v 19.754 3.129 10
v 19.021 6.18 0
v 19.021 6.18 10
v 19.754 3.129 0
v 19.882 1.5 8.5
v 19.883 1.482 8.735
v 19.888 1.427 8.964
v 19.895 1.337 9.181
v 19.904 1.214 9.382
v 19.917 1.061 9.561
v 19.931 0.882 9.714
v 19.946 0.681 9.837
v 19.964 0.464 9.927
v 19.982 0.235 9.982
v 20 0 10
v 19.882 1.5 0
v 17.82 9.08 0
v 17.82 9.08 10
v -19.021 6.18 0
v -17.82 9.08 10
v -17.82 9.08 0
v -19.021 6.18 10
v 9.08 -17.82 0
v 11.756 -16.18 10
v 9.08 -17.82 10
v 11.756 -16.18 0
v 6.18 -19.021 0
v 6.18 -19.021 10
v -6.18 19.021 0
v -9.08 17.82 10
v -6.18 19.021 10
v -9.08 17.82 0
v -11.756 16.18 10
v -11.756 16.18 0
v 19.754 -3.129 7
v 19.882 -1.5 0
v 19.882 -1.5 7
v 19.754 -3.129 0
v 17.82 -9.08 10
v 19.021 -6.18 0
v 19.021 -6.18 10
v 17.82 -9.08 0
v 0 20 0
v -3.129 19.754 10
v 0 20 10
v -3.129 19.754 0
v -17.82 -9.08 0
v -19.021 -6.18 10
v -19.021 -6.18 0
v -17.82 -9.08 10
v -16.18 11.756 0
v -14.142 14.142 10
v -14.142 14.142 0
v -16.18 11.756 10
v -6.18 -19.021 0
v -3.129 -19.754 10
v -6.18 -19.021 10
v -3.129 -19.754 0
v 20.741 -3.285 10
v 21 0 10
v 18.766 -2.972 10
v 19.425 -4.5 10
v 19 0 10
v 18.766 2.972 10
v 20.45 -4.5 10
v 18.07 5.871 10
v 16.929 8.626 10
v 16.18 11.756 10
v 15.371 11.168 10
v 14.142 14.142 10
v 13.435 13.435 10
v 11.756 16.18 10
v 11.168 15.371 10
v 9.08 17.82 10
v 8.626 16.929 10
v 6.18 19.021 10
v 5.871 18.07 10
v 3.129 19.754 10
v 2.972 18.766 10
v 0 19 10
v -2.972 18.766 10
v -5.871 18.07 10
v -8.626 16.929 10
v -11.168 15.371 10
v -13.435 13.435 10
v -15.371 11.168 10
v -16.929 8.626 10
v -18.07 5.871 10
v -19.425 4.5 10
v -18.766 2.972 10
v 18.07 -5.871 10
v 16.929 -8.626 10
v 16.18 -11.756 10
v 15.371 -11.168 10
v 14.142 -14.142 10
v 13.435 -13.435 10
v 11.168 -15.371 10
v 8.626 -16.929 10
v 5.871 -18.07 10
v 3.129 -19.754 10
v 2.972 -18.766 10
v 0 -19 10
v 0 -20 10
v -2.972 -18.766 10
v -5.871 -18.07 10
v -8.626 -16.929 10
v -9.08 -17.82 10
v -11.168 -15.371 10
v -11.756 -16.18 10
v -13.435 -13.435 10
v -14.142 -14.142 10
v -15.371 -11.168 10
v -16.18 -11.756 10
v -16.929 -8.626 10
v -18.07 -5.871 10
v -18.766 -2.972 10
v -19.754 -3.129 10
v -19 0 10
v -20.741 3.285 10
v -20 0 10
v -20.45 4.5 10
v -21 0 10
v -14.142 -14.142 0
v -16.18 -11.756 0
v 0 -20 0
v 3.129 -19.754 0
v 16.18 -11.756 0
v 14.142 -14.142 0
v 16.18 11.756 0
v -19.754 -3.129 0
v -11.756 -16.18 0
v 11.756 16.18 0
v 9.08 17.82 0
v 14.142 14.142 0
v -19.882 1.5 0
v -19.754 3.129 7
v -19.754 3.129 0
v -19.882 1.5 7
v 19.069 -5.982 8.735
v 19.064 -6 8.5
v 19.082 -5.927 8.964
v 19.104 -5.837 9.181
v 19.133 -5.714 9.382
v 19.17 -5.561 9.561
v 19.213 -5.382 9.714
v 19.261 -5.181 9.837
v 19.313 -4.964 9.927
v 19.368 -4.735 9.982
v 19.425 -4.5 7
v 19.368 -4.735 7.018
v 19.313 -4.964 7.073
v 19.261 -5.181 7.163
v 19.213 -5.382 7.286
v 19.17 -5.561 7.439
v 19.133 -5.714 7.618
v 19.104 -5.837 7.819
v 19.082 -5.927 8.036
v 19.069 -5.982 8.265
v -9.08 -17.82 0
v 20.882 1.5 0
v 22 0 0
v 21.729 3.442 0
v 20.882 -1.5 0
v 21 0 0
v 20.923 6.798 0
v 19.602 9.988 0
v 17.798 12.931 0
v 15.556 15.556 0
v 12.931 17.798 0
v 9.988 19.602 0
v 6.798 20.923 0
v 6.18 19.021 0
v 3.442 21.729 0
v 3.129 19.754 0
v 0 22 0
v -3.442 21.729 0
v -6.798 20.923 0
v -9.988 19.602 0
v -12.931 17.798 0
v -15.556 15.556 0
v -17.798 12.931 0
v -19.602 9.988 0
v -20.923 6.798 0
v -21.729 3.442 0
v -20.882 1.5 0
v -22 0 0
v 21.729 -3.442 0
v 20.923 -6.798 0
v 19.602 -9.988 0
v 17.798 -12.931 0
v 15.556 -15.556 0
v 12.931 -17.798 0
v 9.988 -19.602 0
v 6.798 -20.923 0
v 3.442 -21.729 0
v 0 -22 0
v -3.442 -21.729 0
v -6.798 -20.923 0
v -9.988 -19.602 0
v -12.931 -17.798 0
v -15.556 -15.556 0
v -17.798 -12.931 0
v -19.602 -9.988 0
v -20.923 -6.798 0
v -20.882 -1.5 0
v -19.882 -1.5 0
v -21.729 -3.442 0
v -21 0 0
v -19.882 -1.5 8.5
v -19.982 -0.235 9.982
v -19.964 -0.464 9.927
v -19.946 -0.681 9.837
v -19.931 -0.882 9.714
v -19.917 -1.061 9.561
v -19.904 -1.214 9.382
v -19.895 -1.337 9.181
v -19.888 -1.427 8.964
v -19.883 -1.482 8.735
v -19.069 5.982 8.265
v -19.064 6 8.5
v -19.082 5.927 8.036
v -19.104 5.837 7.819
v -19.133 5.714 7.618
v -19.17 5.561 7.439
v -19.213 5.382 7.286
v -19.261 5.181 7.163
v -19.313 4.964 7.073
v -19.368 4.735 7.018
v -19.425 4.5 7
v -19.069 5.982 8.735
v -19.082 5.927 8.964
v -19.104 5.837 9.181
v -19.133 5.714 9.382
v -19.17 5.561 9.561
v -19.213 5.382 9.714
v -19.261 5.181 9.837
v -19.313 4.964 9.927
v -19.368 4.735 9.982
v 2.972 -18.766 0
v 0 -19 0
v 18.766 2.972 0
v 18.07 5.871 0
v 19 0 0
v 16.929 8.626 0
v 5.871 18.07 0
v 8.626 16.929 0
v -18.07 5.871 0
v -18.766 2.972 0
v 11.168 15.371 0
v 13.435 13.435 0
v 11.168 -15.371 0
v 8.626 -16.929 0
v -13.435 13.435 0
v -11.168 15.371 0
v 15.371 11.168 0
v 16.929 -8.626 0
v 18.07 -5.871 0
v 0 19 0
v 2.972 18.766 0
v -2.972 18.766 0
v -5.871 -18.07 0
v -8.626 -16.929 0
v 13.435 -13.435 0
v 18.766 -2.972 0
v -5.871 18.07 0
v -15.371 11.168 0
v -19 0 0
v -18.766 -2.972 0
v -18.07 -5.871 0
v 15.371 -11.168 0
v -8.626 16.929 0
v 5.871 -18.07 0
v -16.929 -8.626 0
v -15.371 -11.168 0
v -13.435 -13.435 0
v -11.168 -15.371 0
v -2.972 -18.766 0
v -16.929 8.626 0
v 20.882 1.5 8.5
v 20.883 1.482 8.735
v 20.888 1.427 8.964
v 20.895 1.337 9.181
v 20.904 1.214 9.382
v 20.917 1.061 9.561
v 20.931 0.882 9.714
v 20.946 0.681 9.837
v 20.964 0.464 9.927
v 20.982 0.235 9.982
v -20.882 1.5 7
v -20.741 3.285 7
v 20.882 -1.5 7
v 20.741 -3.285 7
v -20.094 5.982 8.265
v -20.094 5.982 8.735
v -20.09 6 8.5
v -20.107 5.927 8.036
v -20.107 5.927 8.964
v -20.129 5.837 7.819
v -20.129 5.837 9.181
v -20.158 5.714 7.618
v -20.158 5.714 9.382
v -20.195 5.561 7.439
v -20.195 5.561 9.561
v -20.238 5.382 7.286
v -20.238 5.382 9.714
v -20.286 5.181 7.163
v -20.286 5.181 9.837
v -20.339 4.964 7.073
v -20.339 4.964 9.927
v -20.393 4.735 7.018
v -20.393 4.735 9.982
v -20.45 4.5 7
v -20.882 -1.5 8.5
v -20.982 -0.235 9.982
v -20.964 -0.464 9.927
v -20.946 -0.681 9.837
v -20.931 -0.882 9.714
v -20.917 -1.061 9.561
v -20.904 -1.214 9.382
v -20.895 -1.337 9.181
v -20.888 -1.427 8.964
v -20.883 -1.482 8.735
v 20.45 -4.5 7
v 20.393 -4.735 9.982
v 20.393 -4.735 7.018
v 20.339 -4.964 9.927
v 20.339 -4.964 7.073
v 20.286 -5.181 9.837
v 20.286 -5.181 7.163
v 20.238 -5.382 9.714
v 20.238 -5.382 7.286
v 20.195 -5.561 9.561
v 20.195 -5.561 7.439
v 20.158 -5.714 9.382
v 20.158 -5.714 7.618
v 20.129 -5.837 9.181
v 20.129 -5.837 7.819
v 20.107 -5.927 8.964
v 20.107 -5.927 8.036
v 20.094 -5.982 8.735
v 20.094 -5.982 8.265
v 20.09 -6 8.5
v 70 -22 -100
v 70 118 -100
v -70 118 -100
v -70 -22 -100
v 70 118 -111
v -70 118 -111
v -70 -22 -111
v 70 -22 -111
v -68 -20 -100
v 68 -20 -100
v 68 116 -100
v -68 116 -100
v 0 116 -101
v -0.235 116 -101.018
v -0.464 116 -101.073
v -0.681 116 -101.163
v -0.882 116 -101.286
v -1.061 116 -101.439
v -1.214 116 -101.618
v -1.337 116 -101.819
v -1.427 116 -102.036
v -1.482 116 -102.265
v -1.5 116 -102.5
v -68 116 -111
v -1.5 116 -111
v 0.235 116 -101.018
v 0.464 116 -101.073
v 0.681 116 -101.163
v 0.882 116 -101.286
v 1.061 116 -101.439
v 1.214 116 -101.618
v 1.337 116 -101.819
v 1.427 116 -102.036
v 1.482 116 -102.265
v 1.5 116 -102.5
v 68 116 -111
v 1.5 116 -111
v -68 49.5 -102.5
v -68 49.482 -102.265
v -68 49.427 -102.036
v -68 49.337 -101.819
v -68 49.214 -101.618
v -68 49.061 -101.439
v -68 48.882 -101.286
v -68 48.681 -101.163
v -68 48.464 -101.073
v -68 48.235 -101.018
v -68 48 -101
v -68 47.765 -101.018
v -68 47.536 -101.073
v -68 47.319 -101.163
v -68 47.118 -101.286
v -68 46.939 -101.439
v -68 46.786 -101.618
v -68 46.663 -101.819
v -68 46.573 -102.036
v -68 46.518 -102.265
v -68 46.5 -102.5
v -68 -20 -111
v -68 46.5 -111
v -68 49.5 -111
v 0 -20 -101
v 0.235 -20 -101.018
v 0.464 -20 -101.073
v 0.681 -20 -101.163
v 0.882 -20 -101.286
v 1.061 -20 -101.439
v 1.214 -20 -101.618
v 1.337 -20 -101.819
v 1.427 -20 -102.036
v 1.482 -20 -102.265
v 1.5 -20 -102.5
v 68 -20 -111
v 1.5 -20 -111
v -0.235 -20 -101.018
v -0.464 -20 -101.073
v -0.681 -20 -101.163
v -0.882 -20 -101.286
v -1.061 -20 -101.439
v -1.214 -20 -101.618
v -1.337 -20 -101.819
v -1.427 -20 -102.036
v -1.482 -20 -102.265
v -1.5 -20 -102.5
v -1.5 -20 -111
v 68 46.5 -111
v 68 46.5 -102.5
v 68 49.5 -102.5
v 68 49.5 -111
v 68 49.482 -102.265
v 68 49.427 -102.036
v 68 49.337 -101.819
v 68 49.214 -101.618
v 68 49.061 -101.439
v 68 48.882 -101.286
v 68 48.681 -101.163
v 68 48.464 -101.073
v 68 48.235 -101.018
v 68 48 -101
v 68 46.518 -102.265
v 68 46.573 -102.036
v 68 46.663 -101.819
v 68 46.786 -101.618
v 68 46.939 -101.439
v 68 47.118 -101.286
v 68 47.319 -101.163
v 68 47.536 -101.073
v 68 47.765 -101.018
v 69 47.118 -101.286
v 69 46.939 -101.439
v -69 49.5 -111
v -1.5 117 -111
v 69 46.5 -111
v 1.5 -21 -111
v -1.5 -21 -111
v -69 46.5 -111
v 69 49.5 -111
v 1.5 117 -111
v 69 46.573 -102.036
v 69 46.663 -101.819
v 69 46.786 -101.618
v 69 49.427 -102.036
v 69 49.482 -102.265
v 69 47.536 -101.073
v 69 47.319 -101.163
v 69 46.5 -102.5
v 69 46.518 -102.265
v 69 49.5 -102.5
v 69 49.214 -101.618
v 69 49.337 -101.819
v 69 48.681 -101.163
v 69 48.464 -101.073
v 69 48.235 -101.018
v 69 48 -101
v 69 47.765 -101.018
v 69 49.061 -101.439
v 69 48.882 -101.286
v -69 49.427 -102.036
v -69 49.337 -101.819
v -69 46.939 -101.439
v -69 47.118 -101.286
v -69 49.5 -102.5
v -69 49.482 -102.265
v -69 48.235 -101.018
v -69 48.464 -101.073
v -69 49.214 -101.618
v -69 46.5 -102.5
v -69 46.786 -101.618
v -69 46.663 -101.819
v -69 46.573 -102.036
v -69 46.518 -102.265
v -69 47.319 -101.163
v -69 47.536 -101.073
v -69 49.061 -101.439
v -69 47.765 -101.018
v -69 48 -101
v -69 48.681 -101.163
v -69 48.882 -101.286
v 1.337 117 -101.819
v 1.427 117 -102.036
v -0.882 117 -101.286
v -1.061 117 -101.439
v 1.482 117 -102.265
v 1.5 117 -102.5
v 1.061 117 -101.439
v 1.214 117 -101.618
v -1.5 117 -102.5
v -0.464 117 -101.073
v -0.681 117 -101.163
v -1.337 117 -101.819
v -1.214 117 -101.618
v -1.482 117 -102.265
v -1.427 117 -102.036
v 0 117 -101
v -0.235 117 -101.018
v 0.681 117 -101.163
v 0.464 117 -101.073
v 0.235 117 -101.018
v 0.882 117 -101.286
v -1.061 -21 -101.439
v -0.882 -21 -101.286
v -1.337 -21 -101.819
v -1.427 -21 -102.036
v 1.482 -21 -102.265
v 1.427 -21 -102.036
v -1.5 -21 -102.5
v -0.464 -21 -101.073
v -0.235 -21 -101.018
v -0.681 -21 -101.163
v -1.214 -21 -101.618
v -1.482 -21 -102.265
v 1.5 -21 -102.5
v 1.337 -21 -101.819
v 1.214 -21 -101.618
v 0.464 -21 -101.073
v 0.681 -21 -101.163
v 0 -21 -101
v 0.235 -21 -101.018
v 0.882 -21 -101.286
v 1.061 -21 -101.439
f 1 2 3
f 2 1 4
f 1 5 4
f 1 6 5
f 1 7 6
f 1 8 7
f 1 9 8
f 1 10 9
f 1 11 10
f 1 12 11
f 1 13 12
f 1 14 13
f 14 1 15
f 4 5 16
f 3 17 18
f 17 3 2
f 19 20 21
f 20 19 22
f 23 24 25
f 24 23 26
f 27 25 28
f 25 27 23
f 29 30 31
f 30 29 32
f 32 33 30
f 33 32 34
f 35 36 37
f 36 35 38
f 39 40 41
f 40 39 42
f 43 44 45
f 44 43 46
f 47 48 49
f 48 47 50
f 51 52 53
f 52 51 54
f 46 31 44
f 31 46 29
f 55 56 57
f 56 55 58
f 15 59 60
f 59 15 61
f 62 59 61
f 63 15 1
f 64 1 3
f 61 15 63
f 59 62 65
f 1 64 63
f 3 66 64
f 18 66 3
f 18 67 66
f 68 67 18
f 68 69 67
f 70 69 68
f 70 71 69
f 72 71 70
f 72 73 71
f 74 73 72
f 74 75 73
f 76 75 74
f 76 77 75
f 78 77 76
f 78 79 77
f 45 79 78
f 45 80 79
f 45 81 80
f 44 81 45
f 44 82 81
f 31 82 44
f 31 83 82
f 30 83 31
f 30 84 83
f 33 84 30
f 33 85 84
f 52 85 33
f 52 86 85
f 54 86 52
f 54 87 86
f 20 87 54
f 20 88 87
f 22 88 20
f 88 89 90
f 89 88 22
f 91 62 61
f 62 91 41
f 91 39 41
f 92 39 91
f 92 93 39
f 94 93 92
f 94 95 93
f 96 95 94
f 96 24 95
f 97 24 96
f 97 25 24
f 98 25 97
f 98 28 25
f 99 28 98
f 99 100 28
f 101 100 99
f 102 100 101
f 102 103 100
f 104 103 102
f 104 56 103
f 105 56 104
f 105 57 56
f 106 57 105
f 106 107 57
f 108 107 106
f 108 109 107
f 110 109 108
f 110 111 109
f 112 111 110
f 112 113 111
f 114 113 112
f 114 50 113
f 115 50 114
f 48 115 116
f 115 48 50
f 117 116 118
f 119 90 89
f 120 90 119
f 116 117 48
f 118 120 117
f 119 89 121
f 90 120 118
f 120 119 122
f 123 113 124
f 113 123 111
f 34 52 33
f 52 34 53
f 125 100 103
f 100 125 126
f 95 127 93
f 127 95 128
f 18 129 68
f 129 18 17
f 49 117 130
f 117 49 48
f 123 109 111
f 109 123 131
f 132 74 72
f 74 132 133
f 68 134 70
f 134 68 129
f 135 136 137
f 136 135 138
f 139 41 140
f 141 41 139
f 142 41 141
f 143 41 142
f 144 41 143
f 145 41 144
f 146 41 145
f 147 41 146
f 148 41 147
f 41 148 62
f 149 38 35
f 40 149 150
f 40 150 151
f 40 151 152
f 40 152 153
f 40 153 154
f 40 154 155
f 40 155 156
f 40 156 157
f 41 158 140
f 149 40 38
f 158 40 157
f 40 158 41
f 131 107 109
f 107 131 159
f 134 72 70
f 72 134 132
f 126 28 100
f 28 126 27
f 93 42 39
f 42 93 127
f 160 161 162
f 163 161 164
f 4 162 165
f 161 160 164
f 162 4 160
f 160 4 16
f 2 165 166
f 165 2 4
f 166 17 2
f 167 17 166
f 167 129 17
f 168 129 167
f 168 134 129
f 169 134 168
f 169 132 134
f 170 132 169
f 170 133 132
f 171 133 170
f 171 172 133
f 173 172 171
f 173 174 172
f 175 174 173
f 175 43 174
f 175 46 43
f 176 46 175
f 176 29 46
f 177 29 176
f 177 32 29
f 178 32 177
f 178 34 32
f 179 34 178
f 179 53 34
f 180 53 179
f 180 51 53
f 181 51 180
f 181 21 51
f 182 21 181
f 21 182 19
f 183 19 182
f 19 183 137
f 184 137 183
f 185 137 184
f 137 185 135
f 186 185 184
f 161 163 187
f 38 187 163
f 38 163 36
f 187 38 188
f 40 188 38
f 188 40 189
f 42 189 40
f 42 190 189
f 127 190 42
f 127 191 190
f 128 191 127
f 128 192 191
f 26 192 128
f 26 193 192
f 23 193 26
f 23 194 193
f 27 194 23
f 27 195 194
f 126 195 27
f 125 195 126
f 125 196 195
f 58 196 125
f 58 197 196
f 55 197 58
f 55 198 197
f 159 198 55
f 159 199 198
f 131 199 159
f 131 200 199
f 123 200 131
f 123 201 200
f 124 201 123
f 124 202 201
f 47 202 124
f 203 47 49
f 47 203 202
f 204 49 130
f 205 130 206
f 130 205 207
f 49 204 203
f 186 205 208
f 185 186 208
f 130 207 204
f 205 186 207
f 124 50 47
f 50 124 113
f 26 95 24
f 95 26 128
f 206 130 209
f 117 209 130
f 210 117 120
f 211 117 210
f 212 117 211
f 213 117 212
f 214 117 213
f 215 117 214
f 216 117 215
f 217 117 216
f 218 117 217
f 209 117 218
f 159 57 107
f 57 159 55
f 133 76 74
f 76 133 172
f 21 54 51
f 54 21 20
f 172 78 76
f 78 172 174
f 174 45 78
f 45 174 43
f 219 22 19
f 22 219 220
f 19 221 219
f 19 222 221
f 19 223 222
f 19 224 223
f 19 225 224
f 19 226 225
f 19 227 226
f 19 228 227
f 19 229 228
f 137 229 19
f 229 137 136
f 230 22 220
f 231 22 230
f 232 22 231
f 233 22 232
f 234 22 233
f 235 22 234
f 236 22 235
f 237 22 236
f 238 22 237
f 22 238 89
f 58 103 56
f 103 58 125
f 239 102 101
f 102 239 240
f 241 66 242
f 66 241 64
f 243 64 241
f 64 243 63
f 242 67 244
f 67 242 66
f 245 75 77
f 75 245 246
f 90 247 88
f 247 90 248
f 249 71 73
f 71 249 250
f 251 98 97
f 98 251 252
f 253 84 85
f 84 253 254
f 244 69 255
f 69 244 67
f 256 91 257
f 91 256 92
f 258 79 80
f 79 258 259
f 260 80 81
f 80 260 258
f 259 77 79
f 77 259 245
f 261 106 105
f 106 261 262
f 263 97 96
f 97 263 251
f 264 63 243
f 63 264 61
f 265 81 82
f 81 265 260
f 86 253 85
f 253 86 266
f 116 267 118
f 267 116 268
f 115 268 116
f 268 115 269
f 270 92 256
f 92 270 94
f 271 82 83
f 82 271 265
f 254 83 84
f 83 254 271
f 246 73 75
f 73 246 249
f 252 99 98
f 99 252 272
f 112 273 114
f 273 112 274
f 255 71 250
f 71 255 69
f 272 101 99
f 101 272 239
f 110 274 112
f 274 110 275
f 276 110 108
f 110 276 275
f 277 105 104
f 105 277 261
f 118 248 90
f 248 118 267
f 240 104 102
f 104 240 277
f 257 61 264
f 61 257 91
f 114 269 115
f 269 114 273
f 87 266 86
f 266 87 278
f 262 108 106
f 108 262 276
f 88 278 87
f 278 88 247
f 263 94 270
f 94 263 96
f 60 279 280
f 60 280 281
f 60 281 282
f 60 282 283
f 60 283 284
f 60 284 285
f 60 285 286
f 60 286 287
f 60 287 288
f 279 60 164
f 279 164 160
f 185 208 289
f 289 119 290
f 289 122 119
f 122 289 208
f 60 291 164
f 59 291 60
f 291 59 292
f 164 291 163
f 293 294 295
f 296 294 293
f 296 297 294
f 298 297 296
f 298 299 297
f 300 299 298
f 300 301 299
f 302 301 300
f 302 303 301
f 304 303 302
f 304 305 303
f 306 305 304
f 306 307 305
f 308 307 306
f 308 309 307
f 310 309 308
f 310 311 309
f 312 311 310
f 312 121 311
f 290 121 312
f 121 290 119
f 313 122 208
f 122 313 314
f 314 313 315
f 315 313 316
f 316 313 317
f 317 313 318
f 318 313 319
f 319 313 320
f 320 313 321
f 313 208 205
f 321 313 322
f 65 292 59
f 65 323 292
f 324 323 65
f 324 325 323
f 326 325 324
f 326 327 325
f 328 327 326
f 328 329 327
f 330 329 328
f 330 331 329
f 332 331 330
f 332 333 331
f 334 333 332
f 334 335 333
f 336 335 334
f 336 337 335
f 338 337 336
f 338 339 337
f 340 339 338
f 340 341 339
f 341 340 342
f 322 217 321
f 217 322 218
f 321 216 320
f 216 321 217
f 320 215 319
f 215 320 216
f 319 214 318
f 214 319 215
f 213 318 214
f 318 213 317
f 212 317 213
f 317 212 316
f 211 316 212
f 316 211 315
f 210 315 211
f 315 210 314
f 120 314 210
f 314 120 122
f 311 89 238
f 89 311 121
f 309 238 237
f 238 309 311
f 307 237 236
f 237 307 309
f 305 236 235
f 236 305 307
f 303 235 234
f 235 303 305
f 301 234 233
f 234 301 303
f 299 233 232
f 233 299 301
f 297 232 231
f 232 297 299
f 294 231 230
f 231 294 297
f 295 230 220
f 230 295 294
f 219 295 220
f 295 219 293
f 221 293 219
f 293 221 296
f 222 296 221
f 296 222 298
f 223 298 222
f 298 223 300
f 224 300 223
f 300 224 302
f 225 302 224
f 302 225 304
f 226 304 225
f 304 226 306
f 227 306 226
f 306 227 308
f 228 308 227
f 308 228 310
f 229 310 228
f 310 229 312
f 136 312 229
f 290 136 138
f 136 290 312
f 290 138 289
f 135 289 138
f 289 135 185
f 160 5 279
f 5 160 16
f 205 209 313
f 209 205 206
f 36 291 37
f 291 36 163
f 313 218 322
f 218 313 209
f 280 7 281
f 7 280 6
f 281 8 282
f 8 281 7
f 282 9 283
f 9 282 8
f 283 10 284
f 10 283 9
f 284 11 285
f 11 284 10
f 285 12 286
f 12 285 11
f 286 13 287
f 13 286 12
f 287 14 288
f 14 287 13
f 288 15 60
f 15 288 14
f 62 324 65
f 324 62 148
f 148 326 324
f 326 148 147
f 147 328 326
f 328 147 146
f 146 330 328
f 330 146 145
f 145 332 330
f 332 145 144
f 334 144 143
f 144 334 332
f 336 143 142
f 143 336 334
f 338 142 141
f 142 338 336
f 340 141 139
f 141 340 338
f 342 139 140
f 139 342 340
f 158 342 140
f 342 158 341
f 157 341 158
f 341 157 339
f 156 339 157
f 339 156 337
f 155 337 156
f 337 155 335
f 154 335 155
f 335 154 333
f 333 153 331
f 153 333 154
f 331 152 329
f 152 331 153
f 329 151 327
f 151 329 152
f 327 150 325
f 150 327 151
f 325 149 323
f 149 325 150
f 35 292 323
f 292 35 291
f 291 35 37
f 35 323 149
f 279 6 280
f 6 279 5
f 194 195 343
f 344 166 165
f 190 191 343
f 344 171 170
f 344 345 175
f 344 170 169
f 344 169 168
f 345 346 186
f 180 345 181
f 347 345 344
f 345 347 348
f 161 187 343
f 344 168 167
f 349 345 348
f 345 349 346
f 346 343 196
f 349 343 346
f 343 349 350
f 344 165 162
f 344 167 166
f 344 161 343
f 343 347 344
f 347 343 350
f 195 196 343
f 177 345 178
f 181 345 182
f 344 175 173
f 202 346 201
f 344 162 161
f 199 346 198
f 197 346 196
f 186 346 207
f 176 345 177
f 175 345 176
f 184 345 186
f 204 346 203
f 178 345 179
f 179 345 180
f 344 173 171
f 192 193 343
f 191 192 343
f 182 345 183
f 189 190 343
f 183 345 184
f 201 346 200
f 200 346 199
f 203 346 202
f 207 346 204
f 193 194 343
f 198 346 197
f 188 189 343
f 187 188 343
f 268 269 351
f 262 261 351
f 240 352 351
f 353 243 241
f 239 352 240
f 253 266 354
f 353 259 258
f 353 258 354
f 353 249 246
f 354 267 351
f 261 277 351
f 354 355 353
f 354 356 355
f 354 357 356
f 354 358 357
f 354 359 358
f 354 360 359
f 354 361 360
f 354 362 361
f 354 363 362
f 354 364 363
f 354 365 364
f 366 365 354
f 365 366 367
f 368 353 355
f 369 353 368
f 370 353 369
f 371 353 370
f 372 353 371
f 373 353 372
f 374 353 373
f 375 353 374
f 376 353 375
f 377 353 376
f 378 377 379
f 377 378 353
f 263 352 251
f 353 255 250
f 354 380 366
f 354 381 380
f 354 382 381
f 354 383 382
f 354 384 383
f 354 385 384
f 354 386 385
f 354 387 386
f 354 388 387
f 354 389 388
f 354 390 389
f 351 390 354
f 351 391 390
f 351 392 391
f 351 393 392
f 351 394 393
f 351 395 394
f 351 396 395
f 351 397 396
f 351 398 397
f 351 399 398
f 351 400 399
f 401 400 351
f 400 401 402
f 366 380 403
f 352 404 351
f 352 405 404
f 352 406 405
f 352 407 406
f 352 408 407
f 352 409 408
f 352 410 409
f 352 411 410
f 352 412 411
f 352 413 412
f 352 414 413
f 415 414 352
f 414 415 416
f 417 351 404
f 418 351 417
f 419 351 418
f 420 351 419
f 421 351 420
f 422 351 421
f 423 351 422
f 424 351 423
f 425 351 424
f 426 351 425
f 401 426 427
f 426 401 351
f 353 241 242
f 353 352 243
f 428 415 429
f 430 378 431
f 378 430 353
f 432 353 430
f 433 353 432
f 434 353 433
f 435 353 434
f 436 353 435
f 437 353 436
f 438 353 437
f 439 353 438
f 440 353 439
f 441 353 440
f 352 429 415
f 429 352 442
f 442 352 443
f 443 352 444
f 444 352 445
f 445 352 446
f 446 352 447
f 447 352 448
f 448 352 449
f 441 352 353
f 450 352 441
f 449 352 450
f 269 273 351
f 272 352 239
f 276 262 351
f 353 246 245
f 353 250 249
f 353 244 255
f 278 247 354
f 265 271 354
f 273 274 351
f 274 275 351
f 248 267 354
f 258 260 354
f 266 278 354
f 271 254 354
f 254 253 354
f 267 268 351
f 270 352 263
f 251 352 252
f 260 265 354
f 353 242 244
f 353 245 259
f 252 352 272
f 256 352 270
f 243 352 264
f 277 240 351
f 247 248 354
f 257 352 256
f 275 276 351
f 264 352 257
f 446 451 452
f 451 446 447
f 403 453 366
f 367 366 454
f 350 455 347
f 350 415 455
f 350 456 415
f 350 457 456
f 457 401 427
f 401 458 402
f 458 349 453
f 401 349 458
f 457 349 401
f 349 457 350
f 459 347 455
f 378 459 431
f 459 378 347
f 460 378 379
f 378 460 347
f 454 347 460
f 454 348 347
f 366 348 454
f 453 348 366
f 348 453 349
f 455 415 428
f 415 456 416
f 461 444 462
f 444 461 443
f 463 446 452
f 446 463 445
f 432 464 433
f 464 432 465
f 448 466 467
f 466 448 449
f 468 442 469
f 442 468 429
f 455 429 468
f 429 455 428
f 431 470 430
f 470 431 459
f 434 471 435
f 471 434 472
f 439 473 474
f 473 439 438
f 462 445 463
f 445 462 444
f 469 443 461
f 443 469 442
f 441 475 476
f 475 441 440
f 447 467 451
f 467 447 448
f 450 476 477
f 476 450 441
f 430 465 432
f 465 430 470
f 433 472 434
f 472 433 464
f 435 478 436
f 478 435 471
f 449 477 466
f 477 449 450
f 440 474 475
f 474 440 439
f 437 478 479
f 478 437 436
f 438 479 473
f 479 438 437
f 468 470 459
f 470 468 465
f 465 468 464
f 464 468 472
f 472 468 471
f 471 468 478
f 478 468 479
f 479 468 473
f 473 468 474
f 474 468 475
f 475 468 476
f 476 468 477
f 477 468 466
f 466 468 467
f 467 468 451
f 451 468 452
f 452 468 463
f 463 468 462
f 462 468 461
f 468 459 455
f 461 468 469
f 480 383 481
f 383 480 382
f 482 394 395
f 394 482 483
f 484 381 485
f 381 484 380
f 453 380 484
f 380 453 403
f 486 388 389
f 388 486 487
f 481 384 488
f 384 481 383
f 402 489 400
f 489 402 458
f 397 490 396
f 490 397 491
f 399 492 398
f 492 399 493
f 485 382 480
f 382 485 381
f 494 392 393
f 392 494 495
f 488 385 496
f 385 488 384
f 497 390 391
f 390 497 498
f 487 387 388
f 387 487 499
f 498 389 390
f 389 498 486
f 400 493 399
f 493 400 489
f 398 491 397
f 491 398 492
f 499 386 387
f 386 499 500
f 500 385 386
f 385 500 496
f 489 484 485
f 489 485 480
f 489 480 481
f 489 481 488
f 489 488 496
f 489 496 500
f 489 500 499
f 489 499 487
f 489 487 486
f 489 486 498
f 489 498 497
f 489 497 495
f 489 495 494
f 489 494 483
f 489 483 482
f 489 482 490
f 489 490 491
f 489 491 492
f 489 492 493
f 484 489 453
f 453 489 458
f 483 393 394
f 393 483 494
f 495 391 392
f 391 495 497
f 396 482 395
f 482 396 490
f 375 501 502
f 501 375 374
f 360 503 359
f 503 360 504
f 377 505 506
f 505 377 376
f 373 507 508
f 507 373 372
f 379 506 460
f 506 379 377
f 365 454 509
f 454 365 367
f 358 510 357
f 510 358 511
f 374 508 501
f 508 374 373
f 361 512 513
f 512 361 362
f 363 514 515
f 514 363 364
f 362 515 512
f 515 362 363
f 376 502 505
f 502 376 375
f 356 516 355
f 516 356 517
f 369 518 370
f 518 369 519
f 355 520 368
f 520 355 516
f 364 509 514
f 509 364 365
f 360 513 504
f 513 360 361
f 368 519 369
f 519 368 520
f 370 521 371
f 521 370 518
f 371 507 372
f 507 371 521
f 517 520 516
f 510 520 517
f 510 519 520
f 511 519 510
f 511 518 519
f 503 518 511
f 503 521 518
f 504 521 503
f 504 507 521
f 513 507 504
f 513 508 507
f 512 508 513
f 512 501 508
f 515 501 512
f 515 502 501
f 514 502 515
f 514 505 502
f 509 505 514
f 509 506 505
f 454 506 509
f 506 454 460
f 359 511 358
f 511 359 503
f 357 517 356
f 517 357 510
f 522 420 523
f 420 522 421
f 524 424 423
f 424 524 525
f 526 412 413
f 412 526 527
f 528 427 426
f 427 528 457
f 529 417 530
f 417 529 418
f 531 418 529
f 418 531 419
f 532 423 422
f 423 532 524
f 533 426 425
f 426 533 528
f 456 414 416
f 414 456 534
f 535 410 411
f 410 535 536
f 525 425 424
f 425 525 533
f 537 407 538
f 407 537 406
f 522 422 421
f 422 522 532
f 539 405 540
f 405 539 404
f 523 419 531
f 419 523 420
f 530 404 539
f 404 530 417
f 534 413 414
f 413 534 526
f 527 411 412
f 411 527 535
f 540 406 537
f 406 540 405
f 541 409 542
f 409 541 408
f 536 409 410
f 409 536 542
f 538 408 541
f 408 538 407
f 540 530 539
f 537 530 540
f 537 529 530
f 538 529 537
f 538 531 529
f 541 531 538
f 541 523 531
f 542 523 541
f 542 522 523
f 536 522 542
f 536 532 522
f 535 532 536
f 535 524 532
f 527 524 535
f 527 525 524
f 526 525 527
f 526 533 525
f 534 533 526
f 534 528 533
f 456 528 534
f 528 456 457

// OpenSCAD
// file: modules/tube.scad
/***********
 * Modules *
 ***********/
 module tube (h, inner_r, thick, closed=false) {
     difference() {
         cylinder(h, r=inner_r + thick);
         if(closed) {
             translate([0, 0, -1]) cylinder(h + 1 - thick, r=inner_r);

         } else {
            translate([0, 0, -1]) cylinder(h + 2, r=inner_r);
         }
     }
 }
// file: modules/tie.scad
/*****************
 * Configuration *
 *****************/
// width for the L of the tie
L_width = 3;
// detach length for the L of the tie
L_detach = 6;

/***********
 * Modules *
 ***********/
// Module to create a rounded L
module L(h, add_offset=0) {
    union() {
        hull() {
            square(L_width, center=true);
            translate([0, -add_offset, 0]) square(L_width, center=true);
            translate([h - L_width / 2, 0, 0]) circle(L_width / 2);
            translate([h - L_width / 2, -add_offset, 0]) circle(L_width / 2);
        }
        hull() {
            translate([h - L_width / 2, 0, 0]) circle(L_width / 2);
            translate([h - L_width / 2, L_detach - L_width / 2 , 0]) circle(L_width / 2);
        }
    }
}
// module to create a spinning tie with custom form
module tie_with(h, r, thick) {
    intersection() {
        // extruded cylinder to hold the L
        difference() {
            cylinder(h, r=r + thick);
            translate([0, 0, -1]) cylinder(h+2, r=r);
        }
        // 2 L to perform the tie
        union() {
            children();
            rotate([0, 0, 180]) children();
        }
    }
}
// module to create a spinning tie
module tie(h, r, thick) {
    tie_with(h, r, thick) rotate([0, -90, 0]) linear_extrude(r + 2 * thick) L(h);
}
// reverse module of the spinning tie: use it to diff a solid which must
// accept the spinning tie
module tie_r(h, r, thick) {
    // use a L with the vertical bar larger
    tie_with(h, r, thick) rotate([0, -90, 0]) linear_extrude(r + 2 * thick) L(h, L_detach);
}

// module to create a strait tie
module strait_tie(h, thick) {
    rotate([180, -90, 0]) linear_extrude(thick)
        hull() {
            translate([L_width / 2, 0, 0]) square(L_width, center=true);
            translate([h - L_width / 2, 0, 0]) circle(L_width / 2);
        }
}
// file: modules/food_container.scad
include<tie.scad>;
include<tube.scad>;

/***********
 * Modules *
 ***********/
module food_container() {
    tie_outer_radius = opening_size / 2; // radius of the tie part - forced by case.scad
    tie_tube_thickness = thickness / 2; // thickness of the tie part
    outer_radius = tie_outer_radius + thickness; // global radius - forced by case.scad
    inner_radius = tie_outer_radius - tie_tube_thickness;

    // tie to the spring container
    tube(tie_length, inner_radius, tie_outer_radius - inner_radius);
    tie(tie_length, tie_outer_radius, tie_thickness);

    // container slope
    difference() {
        hull() {
            translate([0, 0, -1]) cylinder(1, r=outer_radius);
            translate([food_container_width / 2, -outer_radius, -food_container_slope_height])
                rotate([0, 180, 0])
                    cube([food_container_width, food_container_depth, 1]);
        }
        hull() {
            translate([0, 0, -1]) cylinder(1, r=inner_radius);
            translate([food_container_width / 2 - thickness, -outer_radius + thickness, -food_container_slope_height])
                rotate([0, 180, 0])
                    cube([food_container_width - 2 * thickness, food_container_depth - 2 * thickness, 1]);
        }
    }

    // tie for extensions
    translate([0, food_container_depth / 2 - outer_radius, -food_container_slope_height - 1 - tie_length / 2]) {
        difference() {
            cube([food_container_width, food_container_depth, tie_length], center=true);
            cube([food_container_width - 2 * thickness, food_container_depth - 2 * thickness, tie_length], center=true);
            translate([0, 0, -tie_length / 2]) {
                translate([food_container_width / 2 - thickness, 0, 0]) strait_tie(tie_length, tie_thickness);
                rotate([0, 0, 180]) translate([food_container_width / 2 - thickness, 0, 0]) strait_tie(tie_length, tie_thickness);
                translate([0, food_container_depth / 2 - thickness, 0]) rotate([0, 0, 90]) strait_tie(tie_length, tie_thickness);
                rotate([0, 0, 180]) translate([0, food_container_depth / 2 - thickness, 0]) rotate([0, 0, 90]) strait_tie(tie_length, tie_thickness);
            }
        }
    }
}
module food_container_extension() {
    tie_tube_thickness = thickness / 2; // thickness of the male tie part

    // extension part
    translate([0, 0, -food_container_extension_height / 2]) {
        difference() {
            cube([food_container_width, food_container_depth, food_container_extension_height], center=true);
            cube([food_container_width - 2 * thickness, food_container_depth - 2 * thickness, food_container_extension_height], center=true);
            translate([0, 0, -food_container_extension_height / 2]) {
                translate([food_container_width / 2 - thickness, 0, 0]) strait_tie(tie_length, tie_thickness);
                rotate([0, 0, 180]) translate([food_container_width / 2 - thickness, 0, 0]) strait_tie(tie_length, tie_thickness);
                translate([0, food_container_depth / 2 - thickness, 0]) rotate([0, 0, 90]) strait_tie(tie_length, tie_thickness);
                rotate([0, 0, 180]) translate([0, food_container_depth / 2 - thickness, 0]) rotate([0, 0, 90]) strait_tie(tie_length, tie_thickness);
            }
        }
    }

    // male tie part
    translate([food_container_width / 2 - thickness, 0, 0]) strait_tie(tie_length, tie_thickness);
    rotate([0, 0, 180]) translate([food_container_width / 2 - thickness, 0, 0]) strait_tie(tie_length, tie_thickness);
    translate([0, food_container_depth / 2 - thickness, 0]) rotate([0, 0, 90]) strait_tie(tie_length, tie_thickness);
    rotate([0, 0, 180]) translate([0, food_container_depth / 2 - thickness, 0]) rotate([0, 0, 90]) strait_tie(tie_length, tie_thickness);

    // support for the male tie
    translate([0, 0, tie_length / 2]) {
        difference() {
            cube([food_container_width - 2 * thickness, food_container_depth - 2 * thickness, tie_length], center=true);
            cube([food_container_width - 2 * thickness - 2 * tie_tube_thickness, food_container_depth - 2 * thickness - 2 * tie_tube_thickness, tie_length], center=true);
        }
    }

}
// file: config.scad
/*****************
 * Configuration *
 *****************/
/*
 * Global
 */

// Resolution
$fn = 40;


/*
 * Spinner
 */

// radius for the spinner (inner and outer)
external_radius = 35 / 2;
internal_radius = 20 / 2;

// pitch - distance between coils (real opening)
pitch = 25;

// length of the spring part
spring_length = 100;
// length of the attach part
attach_length = 20;

// spring resolution - in degrees
step = 5;


/*
 * Spinner container
 */

// Size of the hole for food input/output
opening_size = 40;

// thickness of sides
thickness = 2;

// tie length
tie_length = 10;
tie_thickness = thickness / 2;


/*
 * Motor
 */

// radius of the motor axis
motor_axis_rad = 1;

// radius of the motor
motor_radius = 12;

// length of the motor
motor_length = 20;


/*
 * Main case
 */

// dimensions
main_case_width = 140;
main_case_front_height = 150;
main_case_back_height = 230;
main_case_lower_depth = 100;
main_case_upper_depth = 20;

// back door
back_door_thickness = thickness;
back_door_height = main_case_back_height + 20;

// floor plates
floor_thickness = thickness;

// supports for the arduino
arduino_support_height = 5;
arduino_support_radius = 6;
arduino_support_axis_height = 3;
arduino_support_axis_radius = 1.5;

// Height where to place the center of the spinner
spinner_height = 120;


/*
 * Food container
 */

// dimensions
food_container_width = main_case_width;
food_container_depth = food_container_width;
food_container_slope_height = 100;
food_container_extension_height = 100;
// main file
include<config.scad>;
include<modules/food_container.scad>;


/*************
 * 3D Models *
 *************/
food_container();
